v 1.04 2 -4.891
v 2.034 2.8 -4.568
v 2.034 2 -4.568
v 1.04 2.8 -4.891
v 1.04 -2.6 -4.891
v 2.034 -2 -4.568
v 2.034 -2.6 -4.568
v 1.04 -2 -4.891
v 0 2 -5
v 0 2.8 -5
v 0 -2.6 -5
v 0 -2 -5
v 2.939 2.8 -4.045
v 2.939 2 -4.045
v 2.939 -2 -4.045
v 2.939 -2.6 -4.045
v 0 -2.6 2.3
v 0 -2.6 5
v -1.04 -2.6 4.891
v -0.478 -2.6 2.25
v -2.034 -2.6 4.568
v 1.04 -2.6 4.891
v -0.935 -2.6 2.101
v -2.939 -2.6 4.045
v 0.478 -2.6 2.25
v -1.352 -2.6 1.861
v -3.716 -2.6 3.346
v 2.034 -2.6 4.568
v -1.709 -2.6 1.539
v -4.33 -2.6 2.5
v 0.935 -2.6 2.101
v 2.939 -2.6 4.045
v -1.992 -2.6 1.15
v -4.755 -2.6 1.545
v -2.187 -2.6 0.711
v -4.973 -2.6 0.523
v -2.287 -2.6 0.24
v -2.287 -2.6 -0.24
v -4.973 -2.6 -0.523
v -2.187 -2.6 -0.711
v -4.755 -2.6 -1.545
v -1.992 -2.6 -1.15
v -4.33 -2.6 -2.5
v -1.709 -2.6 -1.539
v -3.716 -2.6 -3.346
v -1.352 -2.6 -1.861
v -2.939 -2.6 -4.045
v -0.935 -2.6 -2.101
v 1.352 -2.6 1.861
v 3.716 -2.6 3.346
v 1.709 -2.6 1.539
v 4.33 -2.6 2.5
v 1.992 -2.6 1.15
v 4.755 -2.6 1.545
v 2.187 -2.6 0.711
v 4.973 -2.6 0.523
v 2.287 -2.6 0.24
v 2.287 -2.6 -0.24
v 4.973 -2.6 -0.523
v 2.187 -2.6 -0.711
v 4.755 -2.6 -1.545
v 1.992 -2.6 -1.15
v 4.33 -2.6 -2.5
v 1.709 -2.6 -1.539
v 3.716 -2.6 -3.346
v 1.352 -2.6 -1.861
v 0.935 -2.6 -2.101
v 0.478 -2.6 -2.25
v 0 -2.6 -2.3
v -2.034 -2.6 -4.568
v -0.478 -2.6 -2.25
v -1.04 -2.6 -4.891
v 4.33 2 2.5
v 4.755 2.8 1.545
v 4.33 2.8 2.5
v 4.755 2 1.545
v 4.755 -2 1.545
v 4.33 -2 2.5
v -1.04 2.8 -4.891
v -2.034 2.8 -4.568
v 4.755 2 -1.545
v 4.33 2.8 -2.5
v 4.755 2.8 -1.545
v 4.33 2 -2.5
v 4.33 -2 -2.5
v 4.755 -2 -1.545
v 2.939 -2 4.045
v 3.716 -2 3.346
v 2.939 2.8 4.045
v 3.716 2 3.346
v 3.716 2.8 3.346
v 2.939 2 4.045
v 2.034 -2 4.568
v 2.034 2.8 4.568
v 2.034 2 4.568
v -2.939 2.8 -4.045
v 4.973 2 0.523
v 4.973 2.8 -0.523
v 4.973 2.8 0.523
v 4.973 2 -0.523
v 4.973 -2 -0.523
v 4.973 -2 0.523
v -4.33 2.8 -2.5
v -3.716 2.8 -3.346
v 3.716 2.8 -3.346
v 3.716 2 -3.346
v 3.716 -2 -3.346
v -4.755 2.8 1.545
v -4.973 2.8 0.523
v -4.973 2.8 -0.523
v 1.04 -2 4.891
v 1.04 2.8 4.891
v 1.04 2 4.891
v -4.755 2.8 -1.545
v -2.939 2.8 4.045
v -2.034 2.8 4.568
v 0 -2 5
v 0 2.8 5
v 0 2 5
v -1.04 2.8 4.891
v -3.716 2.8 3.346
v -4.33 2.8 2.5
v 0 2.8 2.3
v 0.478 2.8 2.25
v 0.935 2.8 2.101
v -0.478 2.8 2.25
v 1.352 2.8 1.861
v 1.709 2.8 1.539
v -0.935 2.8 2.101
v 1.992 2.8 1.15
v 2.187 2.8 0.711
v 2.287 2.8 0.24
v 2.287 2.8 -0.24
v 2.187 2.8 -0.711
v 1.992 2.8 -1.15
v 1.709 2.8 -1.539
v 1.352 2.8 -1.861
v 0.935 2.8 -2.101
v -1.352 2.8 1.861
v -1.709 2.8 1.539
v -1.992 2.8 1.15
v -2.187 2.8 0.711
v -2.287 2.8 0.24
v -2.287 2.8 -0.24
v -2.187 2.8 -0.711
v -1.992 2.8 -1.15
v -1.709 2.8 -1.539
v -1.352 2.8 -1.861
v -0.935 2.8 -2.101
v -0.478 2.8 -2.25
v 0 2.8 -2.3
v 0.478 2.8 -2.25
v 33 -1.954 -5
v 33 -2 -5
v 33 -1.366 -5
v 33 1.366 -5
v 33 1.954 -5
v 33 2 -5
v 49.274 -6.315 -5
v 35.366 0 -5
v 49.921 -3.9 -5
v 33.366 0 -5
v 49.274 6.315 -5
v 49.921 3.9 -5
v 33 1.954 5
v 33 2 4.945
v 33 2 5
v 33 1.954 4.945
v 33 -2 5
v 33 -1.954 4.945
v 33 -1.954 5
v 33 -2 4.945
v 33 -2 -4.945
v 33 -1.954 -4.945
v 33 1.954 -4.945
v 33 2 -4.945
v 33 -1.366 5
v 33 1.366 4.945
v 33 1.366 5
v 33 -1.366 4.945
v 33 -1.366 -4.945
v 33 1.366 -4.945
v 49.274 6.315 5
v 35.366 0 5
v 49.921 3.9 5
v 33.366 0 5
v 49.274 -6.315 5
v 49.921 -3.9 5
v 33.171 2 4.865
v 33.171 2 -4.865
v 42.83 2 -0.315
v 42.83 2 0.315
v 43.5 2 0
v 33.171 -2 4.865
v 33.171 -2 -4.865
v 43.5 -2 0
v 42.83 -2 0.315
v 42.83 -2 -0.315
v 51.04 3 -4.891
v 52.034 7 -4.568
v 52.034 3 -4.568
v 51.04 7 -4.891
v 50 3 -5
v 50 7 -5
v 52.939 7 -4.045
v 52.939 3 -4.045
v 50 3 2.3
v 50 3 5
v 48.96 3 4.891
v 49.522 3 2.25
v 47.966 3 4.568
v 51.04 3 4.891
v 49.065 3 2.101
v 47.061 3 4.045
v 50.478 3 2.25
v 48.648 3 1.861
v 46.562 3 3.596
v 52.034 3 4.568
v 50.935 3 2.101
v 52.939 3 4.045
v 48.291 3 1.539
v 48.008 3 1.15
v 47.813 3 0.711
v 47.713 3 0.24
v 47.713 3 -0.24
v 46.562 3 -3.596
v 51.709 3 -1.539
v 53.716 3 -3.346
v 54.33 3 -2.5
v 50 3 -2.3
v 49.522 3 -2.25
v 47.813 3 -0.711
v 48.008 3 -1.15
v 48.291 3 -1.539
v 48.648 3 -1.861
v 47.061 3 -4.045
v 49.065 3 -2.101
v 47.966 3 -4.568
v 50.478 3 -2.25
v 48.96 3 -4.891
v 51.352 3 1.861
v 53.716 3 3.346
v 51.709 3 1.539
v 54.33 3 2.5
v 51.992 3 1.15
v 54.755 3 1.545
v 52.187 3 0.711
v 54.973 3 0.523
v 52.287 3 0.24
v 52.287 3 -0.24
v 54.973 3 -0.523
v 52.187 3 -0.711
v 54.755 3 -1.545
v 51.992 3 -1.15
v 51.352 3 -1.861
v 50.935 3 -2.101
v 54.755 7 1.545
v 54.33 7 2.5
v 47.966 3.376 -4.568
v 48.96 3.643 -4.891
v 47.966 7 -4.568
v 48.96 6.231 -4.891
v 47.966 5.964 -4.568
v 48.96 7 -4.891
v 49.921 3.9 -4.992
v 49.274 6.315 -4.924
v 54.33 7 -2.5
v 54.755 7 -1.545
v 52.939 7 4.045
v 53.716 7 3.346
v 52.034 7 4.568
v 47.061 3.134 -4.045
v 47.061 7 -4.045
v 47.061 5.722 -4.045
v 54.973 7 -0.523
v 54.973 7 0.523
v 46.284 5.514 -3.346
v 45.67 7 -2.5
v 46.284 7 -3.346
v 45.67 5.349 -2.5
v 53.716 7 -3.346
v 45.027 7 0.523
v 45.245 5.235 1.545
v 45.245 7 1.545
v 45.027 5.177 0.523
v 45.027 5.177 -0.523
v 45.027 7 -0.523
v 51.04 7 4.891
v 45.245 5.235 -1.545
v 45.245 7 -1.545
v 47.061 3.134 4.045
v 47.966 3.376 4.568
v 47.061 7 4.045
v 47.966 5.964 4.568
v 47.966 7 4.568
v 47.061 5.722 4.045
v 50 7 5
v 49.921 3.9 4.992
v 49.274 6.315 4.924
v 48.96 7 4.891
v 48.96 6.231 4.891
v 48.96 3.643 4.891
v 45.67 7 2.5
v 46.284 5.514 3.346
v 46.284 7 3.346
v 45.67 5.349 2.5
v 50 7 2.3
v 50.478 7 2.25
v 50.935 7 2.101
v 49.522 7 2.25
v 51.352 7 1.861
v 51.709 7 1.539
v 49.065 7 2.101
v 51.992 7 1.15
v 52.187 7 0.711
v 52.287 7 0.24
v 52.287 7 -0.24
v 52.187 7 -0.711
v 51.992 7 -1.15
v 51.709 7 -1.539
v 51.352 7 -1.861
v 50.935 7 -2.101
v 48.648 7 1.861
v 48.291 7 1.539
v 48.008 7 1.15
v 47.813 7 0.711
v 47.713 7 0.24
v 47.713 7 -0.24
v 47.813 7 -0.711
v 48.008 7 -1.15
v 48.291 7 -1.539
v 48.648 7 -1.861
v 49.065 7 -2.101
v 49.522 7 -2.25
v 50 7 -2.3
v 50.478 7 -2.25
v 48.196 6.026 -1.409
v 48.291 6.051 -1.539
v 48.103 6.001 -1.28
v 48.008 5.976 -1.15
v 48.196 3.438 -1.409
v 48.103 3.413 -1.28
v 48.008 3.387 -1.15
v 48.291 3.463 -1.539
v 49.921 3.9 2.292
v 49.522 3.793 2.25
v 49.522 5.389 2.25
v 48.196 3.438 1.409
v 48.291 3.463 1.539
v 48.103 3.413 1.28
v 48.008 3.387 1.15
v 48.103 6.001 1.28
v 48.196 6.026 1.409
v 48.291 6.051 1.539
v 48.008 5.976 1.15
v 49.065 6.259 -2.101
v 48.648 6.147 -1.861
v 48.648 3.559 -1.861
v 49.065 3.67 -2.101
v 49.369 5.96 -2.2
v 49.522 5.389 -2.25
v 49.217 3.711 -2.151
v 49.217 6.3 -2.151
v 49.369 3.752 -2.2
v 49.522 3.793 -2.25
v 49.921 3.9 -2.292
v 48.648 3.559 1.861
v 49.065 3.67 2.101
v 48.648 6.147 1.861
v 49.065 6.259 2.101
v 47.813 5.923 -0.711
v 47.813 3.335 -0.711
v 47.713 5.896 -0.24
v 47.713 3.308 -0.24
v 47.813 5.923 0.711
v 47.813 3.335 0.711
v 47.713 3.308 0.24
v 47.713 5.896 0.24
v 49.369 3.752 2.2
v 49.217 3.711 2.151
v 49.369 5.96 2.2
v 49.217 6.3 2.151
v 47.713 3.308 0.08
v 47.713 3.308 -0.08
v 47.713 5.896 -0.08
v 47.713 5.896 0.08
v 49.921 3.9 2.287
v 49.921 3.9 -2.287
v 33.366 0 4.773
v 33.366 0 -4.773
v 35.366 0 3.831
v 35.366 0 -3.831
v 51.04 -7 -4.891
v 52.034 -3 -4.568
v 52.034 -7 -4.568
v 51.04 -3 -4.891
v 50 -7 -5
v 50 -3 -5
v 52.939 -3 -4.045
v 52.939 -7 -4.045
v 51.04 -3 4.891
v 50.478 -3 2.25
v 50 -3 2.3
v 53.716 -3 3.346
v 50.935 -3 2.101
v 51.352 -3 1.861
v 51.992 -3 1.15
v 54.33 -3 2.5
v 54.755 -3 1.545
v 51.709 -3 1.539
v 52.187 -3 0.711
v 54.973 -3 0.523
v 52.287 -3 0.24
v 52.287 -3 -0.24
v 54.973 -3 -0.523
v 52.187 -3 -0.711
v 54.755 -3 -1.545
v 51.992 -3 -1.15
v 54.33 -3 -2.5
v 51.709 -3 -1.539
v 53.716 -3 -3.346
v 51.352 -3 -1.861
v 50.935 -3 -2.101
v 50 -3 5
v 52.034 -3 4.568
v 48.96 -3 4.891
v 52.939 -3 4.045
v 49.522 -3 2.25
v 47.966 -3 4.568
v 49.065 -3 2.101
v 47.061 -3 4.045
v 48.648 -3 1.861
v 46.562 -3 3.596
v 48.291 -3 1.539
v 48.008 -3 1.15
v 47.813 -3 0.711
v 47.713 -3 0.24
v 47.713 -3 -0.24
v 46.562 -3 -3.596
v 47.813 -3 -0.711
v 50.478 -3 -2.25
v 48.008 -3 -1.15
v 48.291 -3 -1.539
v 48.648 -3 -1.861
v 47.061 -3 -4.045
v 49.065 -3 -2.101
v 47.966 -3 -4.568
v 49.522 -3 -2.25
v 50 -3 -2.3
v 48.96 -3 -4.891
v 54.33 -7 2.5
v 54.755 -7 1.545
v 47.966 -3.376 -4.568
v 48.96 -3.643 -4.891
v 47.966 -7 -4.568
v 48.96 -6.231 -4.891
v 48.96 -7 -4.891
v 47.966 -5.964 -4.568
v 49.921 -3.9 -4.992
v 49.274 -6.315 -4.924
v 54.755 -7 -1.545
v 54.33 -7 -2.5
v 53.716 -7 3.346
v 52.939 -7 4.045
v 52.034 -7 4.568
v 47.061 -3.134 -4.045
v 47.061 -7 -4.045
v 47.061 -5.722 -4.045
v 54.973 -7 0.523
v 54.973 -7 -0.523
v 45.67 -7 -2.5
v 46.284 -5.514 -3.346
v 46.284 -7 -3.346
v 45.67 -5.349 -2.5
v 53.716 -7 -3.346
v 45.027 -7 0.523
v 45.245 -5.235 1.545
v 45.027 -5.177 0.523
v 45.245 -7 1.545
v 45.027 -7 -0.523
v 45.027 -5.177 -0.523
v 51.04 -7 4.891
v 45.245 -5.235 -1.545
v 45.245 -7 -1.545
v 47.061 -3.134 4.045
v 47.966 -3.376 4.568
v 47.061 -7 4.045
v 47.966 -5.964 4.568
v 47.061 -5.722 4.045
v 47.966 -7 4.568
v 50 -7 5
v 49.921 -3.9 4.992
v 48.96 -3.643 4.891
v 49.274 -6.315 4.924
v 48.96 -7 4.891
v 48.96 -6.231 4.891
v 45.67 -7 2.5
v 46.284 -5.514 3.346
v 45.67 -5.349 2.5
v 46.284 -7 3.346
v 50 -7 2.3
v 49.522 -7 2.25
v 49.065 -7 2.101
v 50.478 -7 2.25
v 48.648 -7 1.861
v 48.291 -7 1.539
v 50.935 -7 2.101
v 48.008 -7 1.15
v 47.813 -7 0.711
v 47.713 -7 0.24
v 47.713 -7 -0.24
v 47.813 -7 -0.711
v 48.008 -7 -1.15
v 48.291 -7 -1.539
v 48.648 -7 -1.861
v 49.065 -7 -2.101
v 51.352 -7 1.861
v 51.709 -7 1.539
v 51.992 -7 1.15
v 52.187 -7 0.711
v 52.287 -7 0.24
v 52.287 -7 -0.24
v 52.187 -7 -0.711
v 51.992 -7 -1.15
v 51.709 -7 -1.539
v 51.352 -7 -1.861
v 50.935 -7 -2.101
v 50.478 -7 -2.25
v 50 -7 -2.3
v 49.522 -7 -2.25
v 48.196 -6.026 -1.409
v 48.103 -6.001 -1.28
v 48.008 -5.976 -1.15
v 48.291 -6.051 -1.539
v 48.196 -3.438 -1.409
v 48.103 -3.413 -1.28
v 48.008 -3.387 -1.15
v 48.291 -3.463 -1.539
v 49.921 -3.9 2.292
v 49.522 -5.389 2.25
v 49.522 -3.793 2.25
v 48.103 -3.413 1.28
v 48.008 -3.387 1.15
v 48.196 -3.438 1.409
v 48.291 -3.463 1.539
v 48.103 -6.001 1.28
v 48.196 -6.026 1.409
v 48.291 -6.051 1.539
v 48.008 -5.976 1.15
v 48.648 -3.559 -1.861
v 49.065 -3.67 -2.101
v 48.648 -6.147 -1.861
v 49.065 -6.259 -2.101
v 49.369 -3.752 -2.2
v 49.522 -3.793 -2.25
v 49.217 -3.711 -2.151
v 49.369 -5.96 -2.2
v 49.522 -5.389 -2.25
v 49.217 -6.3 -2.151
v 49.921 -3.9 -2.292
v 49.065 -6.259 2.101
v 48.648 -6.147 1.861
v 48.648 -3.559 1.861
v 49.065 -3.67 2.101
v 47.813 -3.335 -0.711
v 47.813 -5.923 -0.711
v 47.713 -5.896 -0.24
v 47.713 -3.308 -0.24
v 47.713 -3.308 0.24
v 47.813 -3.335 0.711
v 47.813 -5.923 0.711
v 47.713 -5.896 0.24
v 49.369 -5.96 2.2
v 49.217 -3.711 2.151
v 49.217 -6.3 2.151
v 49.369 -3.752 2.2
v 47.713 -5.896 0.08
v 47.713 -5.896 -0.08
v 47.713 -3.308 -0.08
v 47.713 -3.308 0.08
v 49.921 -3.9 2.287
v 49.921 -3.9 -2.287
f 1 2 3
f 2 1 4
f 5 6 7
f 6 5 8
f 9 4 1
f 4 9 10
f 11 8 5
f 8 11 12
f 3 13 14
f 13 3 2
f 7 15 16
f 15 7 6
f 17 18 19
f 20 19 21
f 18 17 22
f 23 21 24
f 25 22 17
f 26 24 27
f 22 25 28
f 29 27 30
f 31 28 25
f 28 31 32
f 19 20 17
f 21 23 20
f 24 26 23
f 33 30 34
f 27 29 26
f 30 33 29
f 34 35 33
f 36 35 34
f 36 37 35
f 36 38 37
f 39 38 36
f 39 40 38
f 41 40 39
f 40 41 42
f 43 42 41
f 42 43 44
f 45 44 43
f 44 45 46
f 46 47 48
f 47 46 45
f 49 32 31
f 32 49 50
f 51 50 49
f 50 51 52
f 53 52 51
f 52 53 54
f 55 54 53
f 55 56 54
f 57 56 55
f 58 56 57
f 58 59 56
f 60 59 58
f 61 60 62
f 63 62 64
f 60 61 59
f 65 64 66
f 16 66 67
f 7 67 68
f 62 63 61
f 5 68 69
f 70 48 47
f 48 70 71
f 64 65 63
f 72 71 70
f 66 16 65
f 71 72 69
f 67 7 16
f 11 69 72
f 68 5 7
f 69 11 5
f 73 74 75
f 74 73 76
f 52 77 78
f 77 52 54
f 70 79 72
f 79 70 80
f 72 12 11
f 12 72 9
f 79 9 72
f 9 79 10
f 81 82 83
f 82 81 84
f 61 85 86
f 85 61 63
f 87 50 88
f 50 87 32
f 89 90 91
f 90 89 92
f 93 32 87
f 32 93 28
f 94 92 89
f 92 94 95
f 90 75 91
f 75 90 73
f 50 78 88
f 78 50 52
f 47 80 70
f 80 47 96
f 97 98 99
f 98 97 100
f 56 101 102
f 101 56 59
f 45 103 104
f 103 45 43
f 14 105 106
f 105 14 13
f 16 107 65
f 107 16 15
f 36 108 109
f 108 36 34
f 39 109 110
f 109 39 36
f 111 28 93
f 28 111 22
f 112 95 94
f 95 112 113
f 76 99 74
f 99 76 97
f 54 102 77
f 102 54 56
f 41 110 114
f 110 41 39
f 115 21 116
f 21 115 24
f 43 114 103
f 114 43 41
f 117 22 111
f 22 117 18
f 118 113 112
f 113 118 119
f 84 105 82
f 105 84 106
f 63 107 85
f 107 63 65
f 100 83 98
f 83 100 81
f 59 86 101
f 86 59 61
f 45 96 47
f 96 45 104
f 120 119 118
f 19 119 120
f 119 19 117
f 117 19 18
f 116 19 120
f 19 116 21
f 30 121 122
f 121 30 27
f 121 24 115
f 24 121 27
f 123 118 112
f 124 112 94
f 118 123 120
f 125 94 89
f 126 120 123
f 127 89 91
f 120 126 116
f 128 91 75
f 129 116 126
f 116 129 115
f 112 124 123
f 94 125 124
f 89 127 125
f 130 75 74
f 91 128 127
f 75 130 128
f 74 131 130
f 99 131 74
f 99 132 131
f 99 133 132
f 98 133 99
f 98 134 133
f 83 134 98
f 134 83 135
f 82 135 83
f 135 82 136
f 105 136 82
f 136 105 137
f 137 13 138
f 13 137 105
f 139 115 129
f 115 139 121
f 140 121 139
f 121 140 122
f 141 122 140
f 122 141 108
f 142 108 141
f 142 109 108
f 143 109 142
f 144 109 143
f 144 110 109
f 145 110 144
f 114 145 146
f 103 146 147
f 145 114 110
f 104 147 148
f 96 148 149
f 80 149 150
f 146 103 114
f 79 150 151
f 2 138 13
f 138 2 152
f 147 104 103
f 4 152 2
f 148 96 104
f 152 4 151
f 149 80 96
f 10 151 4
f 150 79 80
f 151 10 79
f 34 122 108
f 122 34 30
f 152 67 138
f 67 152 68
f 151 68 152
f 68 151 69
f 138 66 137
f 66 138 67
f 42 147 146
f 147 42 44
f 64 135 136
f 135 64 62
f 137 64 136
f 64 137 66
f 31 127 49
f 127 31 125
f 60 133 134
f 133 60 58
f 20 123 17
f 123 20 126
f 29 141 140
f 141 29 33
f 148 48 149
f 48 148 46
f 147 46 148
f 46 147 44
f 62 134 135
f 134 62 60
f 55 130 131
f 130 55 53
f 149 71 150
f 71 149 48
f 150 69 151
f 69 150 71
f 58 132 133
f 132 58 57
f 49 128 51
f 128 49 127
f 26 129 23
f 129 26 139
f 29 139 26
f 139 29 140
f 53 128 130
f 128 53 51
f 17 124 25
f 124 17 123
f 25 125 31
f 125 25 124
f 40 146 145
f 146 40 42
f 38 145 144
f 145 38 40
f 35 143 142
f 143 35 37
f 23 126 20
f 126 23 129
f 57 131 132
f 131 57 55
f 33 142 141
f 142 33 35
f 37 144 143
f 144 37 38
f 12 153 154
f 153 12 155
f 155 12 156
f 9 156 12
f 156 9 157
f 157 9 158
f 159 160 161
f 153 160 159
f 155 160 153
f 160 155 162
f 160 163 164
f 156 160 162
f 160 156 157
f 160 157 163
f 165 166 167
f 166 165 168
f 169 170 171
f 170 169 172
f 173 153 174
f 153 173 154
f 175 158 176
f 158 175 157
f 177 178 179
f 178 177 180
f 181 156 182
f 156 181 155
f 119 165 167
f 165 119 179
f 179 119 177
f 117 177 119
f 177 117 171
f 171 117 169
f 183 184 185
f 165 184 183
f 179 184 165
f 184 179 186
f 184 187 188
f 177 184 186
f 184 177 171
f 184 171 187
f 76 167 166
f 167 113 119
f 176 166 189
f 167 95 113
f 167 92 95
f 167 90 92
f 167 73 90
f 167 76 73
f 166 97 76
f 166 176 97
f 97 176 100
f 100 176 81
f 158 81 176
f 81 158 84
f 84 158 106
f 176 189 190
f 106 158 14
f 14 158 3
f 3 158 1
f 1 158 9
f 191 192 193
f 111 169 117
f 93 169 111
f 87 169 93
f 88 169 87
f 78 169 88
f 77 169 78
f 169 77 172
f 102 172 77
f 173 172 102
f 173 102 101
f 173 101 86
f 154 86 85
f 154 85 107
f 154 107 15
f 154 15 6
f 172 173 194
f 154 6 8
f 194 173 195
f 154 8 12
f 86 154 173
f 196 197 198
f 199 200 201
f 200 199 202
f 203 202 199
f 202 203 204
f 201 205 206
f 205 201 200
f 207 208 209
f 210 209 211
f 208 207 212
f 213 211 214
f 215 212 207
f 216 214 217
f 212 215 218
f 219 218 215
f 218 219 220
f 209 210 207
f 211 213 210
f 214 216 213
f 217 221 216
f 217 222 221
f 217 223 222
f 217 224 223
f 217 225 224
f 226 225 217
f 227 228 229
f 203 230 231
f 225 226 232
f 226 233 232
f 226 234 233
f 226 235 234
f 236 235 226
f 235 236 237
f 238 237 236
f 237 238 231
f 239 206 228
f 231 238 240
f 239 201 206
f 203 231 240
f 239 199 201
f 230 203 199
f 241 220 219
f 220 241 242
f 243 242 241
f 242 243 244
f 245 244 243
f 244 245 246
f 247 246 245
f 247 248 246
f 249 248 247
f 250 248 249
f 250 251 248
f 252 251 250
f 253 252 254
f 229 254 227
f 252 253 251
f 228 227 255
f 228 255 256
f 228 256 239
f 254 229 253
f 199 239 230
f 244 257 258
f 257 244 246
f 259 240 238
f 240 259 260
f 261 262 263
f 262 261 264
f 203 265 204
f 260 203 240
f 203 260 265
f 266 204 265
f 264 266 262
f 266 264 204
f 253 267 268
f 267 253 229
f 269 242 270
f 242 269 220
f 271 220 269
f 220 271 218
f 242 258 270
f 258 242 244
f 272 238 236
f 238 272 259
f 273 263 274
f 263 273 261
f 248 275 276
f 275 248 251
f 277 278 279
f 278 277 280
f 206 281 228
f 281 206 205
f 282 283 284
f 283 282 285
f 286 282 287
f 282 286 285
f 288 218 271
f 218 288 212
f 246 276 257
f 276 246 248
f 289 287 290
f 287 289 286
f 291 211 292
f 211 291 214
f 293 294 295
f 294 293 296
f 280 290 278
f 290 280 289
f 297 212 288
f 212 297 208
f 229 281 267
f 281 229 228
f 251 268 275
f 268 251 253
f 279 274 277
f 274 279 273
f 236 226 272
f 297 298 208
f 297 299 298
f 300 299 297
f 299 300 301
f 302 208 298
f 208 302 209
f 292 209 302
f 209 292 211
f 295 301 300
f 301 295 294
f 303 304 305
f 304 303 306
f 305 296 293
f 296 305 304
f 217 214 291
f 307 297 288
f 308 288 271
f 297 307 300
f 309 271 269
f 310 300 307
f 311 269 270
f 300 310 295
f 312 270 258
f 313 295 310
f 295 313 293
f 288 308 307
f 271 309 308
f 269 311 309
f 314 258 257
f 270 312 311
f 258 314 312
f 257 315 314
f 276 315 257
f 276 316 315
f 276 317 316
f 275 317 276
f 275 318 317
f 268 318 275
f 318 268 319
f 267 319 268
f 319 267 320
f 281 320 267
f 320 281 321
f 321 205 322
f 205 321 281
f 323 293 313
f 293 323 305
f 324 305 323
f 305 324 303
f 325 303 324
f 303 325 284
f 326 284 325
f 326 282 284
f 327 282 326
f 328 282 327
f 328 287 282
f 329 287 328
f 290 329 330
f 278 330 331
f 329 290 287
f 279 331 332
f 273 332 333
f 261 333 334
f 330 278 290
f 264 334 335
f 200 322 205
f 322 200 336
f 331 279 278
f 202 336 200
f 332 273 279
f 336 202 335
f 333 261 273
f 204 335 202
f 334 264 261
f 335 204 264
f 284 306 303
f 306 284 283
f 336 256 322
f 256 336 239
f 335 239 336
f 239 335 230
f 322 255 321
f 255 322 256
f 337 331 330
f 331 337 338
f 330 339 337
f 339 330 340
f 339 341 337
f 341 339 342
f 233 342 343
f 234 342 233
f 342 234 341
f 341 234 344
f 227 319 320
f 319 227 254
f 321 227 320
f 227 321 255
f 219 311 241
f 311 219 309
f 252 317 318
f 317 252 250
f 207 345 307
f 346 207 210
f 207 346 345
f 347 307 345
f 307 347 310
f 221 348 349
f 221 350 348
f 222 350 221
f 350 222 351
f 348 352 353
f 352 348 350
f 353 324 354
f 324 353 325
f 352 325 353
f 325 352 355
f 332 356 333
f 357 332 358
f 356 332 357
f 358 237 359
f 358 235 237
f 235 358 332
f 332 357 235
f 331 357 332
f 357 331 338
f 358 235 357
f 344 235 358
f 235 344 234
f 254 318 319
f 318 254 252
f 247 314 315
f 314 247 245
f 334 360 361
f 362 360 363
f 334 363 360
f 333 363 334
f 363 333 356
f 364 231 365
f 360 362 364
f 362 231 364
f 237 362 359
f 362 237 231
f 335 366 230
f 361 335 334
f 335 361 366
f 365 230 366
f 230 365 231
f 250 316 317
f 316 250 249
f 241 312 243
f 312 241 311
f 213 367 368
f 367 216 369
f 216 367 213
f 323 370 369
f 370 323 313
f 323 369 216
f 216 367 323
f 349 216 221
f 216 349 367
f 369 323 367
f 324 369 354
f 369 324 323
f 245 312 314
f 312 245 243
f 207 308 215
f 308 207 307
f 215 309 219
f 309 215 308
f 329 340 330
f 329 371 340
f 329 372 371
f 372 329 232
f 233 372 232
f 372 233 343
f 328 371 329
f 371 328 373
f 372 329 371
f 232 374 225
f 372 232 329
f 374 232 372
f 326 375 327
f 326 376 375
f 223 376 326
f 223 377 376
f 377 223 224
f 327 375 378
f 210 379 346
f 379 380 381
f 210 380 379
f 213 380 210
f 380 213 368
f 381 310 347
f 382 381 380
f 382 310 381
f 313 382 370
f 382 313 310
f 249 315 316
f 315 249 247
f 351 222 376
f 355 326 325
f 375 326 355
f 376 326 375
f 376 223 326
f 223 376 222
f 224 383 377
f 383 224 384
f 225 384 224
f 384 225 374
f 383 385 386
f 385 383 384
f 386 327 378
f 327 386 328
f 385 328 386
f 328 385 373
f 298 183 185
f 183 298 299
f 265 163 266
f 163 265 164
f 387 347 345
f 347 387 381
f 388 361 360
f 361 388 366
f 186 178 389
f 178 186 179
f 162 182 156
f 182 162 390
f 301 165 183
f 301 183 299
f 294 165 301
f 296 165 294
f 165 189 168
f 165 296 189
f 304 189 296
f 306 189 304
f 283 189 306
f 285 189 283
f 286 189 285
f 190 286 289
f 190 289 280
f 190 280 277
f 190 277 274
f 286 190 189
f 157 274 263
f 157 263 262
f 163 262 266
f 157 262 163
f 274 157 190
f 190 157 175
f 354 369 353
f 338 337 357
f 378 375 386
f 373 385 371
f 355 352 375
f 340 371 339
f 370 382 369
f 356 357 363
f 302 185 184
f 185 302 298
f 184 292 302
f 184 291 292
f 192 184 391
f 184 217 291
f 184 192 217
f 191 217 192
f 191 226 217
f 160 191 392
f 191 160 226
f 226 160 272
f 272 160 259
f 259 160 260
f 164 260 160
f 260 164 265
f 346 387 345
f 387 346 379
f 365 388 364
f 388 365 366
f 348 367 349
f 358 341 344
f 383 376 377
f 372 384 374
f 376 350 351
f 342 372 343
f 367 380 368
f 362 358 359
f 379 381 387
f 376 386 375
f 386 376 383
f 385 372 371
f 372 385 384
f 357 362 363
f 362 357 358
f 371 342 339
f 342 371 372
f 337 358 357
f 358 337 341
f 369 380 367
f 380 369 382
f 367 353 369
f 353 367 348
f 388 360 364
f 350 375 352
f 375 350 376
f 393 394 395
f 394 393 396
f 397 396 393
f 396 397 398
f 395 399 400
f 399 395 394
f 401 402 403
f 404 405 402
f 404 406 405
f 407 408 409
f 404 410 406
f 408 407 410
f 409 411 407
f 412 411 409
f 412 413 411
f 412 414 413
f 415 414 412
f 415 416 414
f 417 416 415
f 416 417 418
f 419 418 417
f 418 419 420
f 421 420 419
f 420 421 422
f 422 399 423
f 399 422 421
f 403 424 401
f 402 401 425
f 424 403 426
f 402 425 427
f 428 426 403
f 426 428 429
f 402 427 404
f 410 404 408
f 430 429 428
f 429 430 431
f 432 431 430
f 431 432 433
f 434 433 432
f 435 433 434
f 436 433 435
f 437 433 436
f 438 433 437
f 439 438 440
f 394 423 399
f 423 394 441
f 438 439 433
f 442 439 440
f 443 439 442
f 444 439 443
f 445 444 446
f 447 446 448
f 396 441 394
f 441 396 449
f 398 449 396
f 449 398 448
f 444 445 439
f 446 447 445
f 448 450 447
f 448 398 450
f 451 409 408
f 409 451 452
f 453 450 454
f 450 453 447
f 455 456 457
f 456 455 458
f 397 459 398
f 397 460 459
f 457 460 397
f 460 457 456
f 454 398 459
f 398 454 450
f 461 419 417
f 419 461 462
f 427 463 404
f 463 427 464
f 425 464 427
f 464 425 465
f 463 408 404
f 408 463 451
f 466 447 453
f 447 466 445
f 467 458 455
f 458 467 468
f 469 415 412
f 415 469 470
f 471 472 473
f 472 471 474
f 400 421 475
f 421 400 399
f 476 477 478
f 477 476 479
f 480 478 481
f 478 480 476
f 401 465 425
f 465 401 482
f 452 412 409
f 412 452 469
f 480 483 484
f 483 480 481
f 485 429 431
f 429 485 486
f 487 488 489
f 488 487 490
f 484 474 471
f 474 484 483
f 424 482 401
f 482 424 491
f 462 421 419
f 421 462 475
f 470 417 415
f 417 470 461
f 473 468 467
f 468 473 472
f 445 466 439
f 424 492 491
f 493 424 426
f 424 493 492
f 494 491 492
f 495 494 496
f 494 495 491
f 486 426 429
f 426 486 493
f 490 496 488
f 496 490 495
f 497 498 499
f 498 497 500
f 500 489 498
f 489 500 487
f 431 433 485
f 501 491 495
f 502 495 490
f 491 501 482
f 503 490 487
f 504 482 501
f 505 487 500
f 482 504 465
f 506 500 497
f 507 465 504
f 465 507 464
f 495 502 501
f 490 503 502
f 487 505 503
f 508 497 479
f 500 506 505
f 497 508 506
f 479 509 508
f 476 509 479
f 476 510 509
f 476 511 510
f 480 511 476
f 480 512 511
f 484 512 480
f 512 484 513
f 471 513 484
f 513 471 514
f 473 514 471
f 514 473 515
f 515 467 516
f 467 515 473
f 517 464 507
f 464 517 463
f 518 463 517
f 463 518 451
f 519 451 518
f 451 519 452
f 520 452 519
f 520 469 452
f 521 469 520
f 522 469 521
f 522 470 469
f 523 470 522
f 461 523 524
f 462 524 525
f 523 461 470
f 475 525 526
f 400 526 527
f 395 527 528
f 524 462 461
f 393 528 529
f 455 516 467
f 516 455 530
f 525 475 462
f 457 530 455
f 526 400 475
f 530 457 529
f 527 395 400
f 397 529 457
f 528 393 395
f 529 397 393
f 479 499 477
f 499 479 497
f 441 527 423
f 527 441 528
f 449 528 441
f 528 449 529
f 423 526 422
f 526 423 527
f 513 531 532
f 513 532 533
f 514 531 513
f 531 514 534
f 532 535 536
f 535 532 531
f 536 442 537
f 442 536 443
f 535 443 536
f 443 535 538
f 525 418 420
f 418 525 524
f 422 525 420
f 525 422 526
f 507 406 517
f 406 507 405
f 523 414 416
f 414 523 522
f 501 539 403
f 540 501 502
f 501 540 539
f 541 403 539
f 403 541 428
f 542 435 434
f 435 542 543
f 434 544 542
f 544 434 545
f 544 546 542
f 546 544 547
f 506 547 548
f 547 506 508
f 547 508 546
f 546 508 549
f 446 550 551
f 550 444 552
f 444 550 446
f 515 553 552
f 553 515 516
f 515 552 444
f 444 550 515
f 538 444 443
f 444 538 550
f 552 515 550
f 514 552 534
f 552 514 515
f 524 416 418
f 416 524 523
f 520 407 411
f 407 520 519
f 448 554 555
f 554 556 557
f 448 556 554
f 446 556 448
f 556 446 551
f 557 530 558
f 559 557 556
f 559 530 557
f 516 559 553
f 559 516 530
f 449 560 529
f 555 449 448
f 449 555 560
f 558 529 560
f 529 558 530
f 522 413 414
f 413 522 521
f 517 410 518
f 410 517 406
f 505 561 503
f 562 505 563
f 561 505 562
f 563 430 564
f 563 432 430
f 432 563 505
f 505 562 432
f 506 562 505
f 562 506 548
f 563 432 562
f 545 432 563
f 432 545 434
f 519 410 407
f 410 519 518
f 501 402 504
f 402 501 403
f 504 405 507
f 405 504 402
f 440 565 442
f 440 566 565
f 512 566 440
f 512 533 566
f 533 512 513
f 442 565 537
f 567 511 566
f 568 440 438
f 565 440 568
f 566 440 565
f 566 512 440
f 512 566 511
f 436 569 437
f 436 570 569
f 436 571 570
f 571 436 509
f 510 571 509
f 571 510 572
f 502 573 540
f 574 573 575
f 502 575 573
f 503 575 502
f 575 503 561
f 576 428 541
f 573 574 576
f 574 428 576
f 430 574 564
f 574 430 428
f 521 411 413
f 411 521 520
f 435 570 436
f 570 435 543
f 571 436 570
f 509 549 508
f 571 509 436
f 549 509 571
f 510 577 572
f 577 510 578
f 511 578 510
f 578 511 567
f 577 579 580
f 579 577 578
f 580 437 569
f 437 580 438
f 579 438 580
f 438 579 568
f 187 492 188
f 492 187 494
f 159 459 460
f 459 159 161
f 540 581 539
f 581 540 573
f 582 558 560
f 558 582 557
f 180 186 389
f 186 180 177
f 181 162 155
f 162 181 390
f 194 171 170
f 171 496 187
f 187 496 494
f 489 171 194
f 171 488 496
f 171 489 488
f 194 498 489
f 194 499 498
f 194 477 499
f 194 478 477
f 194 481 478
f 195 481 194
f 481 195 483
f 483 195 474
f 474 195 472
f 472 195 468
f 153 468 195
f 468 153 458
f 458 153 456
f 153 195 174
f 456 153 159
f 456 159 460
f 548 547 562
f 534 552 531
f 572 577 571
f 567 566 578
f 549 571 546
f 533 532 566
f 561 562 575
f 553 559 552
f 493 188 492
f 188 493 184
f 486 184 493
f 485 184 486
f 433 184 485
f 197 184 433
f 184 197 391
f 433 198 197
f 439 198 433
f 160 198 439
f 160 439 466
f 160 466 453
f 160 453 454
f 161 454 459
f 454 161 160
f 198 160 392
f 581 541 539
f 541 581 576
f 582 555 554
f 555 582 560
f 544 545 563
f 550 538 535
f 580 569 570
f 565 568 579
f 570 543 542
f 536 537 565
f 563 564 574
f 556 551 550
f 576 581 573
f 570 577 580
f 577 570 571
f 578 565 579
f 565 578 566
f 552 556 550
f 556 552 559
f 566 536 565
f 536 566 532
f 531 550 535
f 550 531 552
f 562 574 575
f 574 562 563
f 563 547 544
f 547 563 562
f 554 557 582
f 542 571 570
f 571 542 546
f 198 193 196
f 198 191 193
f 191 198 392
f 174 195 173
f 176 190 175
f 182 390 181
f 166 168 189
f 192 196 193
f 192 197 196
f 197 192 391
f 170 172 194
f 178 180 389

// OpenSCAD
length = 50; //mm, distance between rotat axes: min - 20 mm, max - printable size ;)

//right top
module right_top(){
	translate([0,7,length])
		rotate([90,0,0])
			difference() {
				cylinder(4,5,5, $fn=30);
				cylinder(4,2.3,2.3, $fn=30);
			}//difference

	difference(){
		translate([-5,-0.5,(length-16.5)])
			rotate([-15,0,0])
				cube([10,2.5,17]);
		translate([0,8,length])
			rotate([90,0,0])
				cylinder(5,2.3,2.3, $fn=20);
		} //difference

}

rotate([0,90,0]){
//botttom section
	translate([0,2.8,0])
		rotate([90,0,0])		
			difference() {
				cylinder(5.4,5,5, $fn=30);
				cylinder(7,2.3,2.3, $fn=30);
			}//difference


//arm itself
	translate([-5,-2,0])
		difference(){
			cube([10,4,length-17]);
			translate([5,5,0])
				rotate([90,0,0])
					cylinder(7,2.3,2.3, $fn=30);
		}//difference
	translate([0,2,length-13.5])
		rotate([0,270,90])
			scale([7,5.71,1])
			linear_extrude(4)
	 		circle(r=1, $fn=3);

//right top	
	right_top()	;
//left top
	mirror([0,1,0])
		right_top();

} //rotate hole section for printing
